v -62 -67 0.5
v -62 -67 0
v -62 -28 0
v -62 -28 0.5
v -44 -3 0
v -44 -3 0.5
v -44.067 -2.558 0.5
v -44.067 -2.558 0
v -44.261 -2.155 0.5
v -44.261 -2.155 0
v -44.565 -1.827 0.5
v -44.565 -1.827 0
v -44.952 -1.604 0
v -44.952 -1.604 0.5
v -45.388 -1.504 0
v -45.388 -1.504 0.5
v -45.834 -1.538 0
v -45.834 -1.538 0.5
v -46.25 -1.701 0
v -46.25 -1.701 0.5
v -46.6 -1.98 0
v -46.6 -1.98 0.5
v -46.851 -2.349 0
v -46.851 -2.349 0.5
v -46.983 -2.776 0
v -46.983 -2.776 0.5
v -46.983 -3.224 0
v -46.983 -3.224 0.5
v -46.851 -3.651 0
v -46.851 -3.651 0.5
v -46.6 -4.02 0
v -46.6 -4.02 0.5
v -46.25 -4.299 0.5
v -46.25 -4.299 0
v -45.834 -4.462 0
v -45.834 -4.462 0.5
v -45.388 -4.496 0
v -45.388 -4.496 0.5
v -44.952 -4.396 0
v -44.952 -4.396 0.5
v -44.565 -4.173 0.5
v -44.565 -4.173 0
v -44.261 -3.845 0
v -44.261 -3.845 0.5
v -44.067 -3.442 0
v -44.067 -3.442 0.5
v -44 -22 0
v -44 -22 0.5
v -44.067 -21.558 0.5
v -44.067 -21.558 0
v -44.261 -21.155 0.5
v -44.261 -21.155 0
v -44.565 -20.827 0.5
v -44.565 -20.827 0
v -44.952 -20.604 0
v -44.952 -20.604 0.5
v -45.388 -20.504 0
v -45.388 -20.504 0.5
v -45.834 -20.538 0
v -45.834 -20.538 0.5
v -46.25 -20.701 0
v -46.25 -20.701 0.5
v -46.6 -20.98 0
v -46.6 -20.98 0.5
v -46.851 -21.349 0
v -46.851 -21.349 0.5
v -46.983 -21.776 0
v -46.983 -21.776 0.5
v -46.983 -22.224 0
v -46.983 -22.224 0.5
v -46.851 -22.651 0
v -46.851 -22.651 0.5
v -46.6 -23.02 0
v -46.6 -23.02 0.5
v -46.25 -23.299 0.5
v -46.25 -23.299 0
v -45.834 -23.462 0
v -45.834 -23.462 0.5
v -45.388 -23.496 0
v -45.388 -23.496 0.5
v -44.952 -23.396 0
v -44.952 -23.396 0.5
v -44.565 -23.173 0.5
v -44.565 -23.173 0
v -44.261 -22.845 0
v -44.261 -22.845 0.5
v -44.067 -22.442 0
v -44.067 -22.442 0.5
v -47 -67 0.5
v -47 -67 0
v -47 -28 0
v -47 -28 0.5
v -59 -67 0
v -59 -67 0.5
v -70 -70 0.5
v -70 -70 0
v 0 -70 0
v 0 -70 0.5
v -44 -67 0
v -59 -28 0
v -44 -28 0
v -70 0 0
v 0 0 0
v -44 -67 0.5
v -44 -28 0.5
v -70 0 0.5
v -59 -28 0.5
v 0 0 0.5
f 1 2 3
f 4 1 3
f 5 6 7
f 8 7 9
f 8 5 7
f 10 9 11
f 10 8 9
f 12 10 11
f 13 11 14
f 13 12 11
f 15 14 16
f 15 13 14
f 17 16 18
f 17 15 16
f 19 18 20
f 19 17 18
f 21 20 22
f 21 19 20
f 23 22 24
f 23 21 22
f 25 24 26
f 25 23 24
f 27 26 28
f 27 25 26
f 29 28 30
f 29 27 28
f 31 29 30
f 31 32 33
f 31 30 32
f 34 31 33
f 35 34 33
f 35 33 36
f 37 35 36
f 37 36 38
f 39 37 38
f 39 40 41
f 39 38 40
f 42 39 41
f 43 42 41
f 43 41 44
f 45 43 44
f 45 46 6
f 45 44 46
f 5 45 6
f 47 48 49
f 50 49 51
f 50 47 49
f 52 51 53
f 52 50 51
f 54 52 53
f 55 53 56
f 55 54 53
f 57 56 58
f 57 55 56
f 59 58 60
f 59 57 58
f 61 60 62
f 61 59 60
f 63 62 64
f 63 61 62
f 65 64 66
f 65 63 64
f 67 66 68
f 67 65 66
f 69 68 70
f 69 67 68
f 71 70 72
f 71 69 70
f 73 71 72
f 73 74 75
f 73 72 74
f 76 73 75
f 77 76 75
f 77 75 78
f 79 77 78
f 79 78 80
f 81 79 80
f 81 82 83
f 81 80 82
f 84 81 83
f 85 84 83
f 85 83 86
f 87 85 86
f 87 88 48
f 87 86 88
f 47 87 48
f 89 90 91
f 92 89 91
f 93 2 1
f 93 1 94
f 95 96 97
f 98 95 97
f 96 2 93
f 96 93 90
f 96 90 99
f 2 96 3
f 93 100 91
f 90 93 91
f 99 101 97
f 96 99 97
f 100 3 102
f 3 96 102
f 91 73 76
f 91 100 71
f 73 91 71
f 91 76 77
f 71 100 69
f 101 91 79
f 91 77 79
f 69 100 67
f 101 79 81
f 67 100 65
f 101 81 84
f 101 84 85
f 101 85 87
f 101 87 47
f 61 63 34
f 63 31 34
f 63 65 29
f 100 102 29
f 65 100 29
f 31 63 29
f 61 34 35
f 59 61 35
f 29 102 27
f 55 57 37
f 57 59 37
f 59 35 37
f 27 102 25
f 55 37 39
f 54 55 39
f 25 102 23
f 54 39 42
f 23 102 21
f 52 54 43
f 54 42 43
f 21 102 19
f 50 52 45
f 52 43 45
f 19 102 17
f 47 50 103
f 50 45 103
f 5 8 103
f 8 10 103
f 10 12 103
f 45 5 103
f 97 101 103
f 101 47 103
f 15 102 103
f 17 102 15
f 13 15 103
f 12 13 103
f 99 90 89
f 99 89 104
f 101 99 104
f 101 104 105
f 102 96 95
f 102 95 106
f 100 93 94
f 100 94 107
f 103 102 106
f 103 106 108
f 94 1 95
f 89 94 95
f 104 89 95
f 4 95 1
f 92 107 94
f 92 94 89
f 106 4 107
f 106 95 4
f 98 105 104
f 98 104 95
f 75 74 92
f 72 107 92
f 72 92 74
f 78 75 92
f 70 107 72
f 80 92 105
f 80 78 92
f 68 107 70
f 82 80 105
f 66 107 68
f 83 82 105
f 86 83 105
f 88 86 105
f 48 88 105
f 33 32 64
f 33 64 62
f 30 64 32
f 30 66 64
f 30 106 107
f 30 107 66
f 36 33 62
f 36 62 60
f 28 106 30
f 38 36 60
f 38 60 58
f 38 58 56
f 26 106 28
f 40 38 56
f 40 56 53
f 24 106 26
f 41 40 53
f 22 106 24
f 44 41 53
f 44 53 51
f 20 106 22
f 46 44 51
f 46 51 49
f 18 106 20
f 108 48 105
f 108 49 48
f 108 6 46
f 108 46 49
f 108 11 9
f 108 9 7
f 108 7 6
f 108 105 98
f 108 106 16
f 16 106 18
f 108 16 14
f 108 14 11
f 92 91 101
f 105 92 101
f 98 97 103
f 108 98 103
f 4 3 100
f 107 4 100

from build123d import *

# Parameters (mm, degrees)
F0_W     = 70
F0_H     = 70
F1_DEPTH = 0.5
F2_W     = 3
F2_H     = 39
F2_R     = 1.5
F3_DEPTH = 0.501


with BuildPart() as f1:
    # F0 (on Top) → F1 (new body)
    with BuildSketch(Plane.XY):
        with Locations((-35, -35)):
            Rectangle(F0_W, F0_H)
    extrude(amount=F1_DEPTH)

    # F2 (on Top) → F3 (cut, through all)
    with BuildSketch(Plane.XY):
        with Locations((-60.5, -47.5)):
            Rectangle(F2_W, F2_H)
        with Locations((-45.5, -47.5)):
            Rectangle(F2_W, F2_H)
        with Locations((-45.5, -3)):
            Circle(F2_R)
        with Locations((-45.5, -22)):
            Circle(F2_R)
    extrude(amount=F3_DEPTH, mode=Mode.SUBTRACT)


solid = f1.part
